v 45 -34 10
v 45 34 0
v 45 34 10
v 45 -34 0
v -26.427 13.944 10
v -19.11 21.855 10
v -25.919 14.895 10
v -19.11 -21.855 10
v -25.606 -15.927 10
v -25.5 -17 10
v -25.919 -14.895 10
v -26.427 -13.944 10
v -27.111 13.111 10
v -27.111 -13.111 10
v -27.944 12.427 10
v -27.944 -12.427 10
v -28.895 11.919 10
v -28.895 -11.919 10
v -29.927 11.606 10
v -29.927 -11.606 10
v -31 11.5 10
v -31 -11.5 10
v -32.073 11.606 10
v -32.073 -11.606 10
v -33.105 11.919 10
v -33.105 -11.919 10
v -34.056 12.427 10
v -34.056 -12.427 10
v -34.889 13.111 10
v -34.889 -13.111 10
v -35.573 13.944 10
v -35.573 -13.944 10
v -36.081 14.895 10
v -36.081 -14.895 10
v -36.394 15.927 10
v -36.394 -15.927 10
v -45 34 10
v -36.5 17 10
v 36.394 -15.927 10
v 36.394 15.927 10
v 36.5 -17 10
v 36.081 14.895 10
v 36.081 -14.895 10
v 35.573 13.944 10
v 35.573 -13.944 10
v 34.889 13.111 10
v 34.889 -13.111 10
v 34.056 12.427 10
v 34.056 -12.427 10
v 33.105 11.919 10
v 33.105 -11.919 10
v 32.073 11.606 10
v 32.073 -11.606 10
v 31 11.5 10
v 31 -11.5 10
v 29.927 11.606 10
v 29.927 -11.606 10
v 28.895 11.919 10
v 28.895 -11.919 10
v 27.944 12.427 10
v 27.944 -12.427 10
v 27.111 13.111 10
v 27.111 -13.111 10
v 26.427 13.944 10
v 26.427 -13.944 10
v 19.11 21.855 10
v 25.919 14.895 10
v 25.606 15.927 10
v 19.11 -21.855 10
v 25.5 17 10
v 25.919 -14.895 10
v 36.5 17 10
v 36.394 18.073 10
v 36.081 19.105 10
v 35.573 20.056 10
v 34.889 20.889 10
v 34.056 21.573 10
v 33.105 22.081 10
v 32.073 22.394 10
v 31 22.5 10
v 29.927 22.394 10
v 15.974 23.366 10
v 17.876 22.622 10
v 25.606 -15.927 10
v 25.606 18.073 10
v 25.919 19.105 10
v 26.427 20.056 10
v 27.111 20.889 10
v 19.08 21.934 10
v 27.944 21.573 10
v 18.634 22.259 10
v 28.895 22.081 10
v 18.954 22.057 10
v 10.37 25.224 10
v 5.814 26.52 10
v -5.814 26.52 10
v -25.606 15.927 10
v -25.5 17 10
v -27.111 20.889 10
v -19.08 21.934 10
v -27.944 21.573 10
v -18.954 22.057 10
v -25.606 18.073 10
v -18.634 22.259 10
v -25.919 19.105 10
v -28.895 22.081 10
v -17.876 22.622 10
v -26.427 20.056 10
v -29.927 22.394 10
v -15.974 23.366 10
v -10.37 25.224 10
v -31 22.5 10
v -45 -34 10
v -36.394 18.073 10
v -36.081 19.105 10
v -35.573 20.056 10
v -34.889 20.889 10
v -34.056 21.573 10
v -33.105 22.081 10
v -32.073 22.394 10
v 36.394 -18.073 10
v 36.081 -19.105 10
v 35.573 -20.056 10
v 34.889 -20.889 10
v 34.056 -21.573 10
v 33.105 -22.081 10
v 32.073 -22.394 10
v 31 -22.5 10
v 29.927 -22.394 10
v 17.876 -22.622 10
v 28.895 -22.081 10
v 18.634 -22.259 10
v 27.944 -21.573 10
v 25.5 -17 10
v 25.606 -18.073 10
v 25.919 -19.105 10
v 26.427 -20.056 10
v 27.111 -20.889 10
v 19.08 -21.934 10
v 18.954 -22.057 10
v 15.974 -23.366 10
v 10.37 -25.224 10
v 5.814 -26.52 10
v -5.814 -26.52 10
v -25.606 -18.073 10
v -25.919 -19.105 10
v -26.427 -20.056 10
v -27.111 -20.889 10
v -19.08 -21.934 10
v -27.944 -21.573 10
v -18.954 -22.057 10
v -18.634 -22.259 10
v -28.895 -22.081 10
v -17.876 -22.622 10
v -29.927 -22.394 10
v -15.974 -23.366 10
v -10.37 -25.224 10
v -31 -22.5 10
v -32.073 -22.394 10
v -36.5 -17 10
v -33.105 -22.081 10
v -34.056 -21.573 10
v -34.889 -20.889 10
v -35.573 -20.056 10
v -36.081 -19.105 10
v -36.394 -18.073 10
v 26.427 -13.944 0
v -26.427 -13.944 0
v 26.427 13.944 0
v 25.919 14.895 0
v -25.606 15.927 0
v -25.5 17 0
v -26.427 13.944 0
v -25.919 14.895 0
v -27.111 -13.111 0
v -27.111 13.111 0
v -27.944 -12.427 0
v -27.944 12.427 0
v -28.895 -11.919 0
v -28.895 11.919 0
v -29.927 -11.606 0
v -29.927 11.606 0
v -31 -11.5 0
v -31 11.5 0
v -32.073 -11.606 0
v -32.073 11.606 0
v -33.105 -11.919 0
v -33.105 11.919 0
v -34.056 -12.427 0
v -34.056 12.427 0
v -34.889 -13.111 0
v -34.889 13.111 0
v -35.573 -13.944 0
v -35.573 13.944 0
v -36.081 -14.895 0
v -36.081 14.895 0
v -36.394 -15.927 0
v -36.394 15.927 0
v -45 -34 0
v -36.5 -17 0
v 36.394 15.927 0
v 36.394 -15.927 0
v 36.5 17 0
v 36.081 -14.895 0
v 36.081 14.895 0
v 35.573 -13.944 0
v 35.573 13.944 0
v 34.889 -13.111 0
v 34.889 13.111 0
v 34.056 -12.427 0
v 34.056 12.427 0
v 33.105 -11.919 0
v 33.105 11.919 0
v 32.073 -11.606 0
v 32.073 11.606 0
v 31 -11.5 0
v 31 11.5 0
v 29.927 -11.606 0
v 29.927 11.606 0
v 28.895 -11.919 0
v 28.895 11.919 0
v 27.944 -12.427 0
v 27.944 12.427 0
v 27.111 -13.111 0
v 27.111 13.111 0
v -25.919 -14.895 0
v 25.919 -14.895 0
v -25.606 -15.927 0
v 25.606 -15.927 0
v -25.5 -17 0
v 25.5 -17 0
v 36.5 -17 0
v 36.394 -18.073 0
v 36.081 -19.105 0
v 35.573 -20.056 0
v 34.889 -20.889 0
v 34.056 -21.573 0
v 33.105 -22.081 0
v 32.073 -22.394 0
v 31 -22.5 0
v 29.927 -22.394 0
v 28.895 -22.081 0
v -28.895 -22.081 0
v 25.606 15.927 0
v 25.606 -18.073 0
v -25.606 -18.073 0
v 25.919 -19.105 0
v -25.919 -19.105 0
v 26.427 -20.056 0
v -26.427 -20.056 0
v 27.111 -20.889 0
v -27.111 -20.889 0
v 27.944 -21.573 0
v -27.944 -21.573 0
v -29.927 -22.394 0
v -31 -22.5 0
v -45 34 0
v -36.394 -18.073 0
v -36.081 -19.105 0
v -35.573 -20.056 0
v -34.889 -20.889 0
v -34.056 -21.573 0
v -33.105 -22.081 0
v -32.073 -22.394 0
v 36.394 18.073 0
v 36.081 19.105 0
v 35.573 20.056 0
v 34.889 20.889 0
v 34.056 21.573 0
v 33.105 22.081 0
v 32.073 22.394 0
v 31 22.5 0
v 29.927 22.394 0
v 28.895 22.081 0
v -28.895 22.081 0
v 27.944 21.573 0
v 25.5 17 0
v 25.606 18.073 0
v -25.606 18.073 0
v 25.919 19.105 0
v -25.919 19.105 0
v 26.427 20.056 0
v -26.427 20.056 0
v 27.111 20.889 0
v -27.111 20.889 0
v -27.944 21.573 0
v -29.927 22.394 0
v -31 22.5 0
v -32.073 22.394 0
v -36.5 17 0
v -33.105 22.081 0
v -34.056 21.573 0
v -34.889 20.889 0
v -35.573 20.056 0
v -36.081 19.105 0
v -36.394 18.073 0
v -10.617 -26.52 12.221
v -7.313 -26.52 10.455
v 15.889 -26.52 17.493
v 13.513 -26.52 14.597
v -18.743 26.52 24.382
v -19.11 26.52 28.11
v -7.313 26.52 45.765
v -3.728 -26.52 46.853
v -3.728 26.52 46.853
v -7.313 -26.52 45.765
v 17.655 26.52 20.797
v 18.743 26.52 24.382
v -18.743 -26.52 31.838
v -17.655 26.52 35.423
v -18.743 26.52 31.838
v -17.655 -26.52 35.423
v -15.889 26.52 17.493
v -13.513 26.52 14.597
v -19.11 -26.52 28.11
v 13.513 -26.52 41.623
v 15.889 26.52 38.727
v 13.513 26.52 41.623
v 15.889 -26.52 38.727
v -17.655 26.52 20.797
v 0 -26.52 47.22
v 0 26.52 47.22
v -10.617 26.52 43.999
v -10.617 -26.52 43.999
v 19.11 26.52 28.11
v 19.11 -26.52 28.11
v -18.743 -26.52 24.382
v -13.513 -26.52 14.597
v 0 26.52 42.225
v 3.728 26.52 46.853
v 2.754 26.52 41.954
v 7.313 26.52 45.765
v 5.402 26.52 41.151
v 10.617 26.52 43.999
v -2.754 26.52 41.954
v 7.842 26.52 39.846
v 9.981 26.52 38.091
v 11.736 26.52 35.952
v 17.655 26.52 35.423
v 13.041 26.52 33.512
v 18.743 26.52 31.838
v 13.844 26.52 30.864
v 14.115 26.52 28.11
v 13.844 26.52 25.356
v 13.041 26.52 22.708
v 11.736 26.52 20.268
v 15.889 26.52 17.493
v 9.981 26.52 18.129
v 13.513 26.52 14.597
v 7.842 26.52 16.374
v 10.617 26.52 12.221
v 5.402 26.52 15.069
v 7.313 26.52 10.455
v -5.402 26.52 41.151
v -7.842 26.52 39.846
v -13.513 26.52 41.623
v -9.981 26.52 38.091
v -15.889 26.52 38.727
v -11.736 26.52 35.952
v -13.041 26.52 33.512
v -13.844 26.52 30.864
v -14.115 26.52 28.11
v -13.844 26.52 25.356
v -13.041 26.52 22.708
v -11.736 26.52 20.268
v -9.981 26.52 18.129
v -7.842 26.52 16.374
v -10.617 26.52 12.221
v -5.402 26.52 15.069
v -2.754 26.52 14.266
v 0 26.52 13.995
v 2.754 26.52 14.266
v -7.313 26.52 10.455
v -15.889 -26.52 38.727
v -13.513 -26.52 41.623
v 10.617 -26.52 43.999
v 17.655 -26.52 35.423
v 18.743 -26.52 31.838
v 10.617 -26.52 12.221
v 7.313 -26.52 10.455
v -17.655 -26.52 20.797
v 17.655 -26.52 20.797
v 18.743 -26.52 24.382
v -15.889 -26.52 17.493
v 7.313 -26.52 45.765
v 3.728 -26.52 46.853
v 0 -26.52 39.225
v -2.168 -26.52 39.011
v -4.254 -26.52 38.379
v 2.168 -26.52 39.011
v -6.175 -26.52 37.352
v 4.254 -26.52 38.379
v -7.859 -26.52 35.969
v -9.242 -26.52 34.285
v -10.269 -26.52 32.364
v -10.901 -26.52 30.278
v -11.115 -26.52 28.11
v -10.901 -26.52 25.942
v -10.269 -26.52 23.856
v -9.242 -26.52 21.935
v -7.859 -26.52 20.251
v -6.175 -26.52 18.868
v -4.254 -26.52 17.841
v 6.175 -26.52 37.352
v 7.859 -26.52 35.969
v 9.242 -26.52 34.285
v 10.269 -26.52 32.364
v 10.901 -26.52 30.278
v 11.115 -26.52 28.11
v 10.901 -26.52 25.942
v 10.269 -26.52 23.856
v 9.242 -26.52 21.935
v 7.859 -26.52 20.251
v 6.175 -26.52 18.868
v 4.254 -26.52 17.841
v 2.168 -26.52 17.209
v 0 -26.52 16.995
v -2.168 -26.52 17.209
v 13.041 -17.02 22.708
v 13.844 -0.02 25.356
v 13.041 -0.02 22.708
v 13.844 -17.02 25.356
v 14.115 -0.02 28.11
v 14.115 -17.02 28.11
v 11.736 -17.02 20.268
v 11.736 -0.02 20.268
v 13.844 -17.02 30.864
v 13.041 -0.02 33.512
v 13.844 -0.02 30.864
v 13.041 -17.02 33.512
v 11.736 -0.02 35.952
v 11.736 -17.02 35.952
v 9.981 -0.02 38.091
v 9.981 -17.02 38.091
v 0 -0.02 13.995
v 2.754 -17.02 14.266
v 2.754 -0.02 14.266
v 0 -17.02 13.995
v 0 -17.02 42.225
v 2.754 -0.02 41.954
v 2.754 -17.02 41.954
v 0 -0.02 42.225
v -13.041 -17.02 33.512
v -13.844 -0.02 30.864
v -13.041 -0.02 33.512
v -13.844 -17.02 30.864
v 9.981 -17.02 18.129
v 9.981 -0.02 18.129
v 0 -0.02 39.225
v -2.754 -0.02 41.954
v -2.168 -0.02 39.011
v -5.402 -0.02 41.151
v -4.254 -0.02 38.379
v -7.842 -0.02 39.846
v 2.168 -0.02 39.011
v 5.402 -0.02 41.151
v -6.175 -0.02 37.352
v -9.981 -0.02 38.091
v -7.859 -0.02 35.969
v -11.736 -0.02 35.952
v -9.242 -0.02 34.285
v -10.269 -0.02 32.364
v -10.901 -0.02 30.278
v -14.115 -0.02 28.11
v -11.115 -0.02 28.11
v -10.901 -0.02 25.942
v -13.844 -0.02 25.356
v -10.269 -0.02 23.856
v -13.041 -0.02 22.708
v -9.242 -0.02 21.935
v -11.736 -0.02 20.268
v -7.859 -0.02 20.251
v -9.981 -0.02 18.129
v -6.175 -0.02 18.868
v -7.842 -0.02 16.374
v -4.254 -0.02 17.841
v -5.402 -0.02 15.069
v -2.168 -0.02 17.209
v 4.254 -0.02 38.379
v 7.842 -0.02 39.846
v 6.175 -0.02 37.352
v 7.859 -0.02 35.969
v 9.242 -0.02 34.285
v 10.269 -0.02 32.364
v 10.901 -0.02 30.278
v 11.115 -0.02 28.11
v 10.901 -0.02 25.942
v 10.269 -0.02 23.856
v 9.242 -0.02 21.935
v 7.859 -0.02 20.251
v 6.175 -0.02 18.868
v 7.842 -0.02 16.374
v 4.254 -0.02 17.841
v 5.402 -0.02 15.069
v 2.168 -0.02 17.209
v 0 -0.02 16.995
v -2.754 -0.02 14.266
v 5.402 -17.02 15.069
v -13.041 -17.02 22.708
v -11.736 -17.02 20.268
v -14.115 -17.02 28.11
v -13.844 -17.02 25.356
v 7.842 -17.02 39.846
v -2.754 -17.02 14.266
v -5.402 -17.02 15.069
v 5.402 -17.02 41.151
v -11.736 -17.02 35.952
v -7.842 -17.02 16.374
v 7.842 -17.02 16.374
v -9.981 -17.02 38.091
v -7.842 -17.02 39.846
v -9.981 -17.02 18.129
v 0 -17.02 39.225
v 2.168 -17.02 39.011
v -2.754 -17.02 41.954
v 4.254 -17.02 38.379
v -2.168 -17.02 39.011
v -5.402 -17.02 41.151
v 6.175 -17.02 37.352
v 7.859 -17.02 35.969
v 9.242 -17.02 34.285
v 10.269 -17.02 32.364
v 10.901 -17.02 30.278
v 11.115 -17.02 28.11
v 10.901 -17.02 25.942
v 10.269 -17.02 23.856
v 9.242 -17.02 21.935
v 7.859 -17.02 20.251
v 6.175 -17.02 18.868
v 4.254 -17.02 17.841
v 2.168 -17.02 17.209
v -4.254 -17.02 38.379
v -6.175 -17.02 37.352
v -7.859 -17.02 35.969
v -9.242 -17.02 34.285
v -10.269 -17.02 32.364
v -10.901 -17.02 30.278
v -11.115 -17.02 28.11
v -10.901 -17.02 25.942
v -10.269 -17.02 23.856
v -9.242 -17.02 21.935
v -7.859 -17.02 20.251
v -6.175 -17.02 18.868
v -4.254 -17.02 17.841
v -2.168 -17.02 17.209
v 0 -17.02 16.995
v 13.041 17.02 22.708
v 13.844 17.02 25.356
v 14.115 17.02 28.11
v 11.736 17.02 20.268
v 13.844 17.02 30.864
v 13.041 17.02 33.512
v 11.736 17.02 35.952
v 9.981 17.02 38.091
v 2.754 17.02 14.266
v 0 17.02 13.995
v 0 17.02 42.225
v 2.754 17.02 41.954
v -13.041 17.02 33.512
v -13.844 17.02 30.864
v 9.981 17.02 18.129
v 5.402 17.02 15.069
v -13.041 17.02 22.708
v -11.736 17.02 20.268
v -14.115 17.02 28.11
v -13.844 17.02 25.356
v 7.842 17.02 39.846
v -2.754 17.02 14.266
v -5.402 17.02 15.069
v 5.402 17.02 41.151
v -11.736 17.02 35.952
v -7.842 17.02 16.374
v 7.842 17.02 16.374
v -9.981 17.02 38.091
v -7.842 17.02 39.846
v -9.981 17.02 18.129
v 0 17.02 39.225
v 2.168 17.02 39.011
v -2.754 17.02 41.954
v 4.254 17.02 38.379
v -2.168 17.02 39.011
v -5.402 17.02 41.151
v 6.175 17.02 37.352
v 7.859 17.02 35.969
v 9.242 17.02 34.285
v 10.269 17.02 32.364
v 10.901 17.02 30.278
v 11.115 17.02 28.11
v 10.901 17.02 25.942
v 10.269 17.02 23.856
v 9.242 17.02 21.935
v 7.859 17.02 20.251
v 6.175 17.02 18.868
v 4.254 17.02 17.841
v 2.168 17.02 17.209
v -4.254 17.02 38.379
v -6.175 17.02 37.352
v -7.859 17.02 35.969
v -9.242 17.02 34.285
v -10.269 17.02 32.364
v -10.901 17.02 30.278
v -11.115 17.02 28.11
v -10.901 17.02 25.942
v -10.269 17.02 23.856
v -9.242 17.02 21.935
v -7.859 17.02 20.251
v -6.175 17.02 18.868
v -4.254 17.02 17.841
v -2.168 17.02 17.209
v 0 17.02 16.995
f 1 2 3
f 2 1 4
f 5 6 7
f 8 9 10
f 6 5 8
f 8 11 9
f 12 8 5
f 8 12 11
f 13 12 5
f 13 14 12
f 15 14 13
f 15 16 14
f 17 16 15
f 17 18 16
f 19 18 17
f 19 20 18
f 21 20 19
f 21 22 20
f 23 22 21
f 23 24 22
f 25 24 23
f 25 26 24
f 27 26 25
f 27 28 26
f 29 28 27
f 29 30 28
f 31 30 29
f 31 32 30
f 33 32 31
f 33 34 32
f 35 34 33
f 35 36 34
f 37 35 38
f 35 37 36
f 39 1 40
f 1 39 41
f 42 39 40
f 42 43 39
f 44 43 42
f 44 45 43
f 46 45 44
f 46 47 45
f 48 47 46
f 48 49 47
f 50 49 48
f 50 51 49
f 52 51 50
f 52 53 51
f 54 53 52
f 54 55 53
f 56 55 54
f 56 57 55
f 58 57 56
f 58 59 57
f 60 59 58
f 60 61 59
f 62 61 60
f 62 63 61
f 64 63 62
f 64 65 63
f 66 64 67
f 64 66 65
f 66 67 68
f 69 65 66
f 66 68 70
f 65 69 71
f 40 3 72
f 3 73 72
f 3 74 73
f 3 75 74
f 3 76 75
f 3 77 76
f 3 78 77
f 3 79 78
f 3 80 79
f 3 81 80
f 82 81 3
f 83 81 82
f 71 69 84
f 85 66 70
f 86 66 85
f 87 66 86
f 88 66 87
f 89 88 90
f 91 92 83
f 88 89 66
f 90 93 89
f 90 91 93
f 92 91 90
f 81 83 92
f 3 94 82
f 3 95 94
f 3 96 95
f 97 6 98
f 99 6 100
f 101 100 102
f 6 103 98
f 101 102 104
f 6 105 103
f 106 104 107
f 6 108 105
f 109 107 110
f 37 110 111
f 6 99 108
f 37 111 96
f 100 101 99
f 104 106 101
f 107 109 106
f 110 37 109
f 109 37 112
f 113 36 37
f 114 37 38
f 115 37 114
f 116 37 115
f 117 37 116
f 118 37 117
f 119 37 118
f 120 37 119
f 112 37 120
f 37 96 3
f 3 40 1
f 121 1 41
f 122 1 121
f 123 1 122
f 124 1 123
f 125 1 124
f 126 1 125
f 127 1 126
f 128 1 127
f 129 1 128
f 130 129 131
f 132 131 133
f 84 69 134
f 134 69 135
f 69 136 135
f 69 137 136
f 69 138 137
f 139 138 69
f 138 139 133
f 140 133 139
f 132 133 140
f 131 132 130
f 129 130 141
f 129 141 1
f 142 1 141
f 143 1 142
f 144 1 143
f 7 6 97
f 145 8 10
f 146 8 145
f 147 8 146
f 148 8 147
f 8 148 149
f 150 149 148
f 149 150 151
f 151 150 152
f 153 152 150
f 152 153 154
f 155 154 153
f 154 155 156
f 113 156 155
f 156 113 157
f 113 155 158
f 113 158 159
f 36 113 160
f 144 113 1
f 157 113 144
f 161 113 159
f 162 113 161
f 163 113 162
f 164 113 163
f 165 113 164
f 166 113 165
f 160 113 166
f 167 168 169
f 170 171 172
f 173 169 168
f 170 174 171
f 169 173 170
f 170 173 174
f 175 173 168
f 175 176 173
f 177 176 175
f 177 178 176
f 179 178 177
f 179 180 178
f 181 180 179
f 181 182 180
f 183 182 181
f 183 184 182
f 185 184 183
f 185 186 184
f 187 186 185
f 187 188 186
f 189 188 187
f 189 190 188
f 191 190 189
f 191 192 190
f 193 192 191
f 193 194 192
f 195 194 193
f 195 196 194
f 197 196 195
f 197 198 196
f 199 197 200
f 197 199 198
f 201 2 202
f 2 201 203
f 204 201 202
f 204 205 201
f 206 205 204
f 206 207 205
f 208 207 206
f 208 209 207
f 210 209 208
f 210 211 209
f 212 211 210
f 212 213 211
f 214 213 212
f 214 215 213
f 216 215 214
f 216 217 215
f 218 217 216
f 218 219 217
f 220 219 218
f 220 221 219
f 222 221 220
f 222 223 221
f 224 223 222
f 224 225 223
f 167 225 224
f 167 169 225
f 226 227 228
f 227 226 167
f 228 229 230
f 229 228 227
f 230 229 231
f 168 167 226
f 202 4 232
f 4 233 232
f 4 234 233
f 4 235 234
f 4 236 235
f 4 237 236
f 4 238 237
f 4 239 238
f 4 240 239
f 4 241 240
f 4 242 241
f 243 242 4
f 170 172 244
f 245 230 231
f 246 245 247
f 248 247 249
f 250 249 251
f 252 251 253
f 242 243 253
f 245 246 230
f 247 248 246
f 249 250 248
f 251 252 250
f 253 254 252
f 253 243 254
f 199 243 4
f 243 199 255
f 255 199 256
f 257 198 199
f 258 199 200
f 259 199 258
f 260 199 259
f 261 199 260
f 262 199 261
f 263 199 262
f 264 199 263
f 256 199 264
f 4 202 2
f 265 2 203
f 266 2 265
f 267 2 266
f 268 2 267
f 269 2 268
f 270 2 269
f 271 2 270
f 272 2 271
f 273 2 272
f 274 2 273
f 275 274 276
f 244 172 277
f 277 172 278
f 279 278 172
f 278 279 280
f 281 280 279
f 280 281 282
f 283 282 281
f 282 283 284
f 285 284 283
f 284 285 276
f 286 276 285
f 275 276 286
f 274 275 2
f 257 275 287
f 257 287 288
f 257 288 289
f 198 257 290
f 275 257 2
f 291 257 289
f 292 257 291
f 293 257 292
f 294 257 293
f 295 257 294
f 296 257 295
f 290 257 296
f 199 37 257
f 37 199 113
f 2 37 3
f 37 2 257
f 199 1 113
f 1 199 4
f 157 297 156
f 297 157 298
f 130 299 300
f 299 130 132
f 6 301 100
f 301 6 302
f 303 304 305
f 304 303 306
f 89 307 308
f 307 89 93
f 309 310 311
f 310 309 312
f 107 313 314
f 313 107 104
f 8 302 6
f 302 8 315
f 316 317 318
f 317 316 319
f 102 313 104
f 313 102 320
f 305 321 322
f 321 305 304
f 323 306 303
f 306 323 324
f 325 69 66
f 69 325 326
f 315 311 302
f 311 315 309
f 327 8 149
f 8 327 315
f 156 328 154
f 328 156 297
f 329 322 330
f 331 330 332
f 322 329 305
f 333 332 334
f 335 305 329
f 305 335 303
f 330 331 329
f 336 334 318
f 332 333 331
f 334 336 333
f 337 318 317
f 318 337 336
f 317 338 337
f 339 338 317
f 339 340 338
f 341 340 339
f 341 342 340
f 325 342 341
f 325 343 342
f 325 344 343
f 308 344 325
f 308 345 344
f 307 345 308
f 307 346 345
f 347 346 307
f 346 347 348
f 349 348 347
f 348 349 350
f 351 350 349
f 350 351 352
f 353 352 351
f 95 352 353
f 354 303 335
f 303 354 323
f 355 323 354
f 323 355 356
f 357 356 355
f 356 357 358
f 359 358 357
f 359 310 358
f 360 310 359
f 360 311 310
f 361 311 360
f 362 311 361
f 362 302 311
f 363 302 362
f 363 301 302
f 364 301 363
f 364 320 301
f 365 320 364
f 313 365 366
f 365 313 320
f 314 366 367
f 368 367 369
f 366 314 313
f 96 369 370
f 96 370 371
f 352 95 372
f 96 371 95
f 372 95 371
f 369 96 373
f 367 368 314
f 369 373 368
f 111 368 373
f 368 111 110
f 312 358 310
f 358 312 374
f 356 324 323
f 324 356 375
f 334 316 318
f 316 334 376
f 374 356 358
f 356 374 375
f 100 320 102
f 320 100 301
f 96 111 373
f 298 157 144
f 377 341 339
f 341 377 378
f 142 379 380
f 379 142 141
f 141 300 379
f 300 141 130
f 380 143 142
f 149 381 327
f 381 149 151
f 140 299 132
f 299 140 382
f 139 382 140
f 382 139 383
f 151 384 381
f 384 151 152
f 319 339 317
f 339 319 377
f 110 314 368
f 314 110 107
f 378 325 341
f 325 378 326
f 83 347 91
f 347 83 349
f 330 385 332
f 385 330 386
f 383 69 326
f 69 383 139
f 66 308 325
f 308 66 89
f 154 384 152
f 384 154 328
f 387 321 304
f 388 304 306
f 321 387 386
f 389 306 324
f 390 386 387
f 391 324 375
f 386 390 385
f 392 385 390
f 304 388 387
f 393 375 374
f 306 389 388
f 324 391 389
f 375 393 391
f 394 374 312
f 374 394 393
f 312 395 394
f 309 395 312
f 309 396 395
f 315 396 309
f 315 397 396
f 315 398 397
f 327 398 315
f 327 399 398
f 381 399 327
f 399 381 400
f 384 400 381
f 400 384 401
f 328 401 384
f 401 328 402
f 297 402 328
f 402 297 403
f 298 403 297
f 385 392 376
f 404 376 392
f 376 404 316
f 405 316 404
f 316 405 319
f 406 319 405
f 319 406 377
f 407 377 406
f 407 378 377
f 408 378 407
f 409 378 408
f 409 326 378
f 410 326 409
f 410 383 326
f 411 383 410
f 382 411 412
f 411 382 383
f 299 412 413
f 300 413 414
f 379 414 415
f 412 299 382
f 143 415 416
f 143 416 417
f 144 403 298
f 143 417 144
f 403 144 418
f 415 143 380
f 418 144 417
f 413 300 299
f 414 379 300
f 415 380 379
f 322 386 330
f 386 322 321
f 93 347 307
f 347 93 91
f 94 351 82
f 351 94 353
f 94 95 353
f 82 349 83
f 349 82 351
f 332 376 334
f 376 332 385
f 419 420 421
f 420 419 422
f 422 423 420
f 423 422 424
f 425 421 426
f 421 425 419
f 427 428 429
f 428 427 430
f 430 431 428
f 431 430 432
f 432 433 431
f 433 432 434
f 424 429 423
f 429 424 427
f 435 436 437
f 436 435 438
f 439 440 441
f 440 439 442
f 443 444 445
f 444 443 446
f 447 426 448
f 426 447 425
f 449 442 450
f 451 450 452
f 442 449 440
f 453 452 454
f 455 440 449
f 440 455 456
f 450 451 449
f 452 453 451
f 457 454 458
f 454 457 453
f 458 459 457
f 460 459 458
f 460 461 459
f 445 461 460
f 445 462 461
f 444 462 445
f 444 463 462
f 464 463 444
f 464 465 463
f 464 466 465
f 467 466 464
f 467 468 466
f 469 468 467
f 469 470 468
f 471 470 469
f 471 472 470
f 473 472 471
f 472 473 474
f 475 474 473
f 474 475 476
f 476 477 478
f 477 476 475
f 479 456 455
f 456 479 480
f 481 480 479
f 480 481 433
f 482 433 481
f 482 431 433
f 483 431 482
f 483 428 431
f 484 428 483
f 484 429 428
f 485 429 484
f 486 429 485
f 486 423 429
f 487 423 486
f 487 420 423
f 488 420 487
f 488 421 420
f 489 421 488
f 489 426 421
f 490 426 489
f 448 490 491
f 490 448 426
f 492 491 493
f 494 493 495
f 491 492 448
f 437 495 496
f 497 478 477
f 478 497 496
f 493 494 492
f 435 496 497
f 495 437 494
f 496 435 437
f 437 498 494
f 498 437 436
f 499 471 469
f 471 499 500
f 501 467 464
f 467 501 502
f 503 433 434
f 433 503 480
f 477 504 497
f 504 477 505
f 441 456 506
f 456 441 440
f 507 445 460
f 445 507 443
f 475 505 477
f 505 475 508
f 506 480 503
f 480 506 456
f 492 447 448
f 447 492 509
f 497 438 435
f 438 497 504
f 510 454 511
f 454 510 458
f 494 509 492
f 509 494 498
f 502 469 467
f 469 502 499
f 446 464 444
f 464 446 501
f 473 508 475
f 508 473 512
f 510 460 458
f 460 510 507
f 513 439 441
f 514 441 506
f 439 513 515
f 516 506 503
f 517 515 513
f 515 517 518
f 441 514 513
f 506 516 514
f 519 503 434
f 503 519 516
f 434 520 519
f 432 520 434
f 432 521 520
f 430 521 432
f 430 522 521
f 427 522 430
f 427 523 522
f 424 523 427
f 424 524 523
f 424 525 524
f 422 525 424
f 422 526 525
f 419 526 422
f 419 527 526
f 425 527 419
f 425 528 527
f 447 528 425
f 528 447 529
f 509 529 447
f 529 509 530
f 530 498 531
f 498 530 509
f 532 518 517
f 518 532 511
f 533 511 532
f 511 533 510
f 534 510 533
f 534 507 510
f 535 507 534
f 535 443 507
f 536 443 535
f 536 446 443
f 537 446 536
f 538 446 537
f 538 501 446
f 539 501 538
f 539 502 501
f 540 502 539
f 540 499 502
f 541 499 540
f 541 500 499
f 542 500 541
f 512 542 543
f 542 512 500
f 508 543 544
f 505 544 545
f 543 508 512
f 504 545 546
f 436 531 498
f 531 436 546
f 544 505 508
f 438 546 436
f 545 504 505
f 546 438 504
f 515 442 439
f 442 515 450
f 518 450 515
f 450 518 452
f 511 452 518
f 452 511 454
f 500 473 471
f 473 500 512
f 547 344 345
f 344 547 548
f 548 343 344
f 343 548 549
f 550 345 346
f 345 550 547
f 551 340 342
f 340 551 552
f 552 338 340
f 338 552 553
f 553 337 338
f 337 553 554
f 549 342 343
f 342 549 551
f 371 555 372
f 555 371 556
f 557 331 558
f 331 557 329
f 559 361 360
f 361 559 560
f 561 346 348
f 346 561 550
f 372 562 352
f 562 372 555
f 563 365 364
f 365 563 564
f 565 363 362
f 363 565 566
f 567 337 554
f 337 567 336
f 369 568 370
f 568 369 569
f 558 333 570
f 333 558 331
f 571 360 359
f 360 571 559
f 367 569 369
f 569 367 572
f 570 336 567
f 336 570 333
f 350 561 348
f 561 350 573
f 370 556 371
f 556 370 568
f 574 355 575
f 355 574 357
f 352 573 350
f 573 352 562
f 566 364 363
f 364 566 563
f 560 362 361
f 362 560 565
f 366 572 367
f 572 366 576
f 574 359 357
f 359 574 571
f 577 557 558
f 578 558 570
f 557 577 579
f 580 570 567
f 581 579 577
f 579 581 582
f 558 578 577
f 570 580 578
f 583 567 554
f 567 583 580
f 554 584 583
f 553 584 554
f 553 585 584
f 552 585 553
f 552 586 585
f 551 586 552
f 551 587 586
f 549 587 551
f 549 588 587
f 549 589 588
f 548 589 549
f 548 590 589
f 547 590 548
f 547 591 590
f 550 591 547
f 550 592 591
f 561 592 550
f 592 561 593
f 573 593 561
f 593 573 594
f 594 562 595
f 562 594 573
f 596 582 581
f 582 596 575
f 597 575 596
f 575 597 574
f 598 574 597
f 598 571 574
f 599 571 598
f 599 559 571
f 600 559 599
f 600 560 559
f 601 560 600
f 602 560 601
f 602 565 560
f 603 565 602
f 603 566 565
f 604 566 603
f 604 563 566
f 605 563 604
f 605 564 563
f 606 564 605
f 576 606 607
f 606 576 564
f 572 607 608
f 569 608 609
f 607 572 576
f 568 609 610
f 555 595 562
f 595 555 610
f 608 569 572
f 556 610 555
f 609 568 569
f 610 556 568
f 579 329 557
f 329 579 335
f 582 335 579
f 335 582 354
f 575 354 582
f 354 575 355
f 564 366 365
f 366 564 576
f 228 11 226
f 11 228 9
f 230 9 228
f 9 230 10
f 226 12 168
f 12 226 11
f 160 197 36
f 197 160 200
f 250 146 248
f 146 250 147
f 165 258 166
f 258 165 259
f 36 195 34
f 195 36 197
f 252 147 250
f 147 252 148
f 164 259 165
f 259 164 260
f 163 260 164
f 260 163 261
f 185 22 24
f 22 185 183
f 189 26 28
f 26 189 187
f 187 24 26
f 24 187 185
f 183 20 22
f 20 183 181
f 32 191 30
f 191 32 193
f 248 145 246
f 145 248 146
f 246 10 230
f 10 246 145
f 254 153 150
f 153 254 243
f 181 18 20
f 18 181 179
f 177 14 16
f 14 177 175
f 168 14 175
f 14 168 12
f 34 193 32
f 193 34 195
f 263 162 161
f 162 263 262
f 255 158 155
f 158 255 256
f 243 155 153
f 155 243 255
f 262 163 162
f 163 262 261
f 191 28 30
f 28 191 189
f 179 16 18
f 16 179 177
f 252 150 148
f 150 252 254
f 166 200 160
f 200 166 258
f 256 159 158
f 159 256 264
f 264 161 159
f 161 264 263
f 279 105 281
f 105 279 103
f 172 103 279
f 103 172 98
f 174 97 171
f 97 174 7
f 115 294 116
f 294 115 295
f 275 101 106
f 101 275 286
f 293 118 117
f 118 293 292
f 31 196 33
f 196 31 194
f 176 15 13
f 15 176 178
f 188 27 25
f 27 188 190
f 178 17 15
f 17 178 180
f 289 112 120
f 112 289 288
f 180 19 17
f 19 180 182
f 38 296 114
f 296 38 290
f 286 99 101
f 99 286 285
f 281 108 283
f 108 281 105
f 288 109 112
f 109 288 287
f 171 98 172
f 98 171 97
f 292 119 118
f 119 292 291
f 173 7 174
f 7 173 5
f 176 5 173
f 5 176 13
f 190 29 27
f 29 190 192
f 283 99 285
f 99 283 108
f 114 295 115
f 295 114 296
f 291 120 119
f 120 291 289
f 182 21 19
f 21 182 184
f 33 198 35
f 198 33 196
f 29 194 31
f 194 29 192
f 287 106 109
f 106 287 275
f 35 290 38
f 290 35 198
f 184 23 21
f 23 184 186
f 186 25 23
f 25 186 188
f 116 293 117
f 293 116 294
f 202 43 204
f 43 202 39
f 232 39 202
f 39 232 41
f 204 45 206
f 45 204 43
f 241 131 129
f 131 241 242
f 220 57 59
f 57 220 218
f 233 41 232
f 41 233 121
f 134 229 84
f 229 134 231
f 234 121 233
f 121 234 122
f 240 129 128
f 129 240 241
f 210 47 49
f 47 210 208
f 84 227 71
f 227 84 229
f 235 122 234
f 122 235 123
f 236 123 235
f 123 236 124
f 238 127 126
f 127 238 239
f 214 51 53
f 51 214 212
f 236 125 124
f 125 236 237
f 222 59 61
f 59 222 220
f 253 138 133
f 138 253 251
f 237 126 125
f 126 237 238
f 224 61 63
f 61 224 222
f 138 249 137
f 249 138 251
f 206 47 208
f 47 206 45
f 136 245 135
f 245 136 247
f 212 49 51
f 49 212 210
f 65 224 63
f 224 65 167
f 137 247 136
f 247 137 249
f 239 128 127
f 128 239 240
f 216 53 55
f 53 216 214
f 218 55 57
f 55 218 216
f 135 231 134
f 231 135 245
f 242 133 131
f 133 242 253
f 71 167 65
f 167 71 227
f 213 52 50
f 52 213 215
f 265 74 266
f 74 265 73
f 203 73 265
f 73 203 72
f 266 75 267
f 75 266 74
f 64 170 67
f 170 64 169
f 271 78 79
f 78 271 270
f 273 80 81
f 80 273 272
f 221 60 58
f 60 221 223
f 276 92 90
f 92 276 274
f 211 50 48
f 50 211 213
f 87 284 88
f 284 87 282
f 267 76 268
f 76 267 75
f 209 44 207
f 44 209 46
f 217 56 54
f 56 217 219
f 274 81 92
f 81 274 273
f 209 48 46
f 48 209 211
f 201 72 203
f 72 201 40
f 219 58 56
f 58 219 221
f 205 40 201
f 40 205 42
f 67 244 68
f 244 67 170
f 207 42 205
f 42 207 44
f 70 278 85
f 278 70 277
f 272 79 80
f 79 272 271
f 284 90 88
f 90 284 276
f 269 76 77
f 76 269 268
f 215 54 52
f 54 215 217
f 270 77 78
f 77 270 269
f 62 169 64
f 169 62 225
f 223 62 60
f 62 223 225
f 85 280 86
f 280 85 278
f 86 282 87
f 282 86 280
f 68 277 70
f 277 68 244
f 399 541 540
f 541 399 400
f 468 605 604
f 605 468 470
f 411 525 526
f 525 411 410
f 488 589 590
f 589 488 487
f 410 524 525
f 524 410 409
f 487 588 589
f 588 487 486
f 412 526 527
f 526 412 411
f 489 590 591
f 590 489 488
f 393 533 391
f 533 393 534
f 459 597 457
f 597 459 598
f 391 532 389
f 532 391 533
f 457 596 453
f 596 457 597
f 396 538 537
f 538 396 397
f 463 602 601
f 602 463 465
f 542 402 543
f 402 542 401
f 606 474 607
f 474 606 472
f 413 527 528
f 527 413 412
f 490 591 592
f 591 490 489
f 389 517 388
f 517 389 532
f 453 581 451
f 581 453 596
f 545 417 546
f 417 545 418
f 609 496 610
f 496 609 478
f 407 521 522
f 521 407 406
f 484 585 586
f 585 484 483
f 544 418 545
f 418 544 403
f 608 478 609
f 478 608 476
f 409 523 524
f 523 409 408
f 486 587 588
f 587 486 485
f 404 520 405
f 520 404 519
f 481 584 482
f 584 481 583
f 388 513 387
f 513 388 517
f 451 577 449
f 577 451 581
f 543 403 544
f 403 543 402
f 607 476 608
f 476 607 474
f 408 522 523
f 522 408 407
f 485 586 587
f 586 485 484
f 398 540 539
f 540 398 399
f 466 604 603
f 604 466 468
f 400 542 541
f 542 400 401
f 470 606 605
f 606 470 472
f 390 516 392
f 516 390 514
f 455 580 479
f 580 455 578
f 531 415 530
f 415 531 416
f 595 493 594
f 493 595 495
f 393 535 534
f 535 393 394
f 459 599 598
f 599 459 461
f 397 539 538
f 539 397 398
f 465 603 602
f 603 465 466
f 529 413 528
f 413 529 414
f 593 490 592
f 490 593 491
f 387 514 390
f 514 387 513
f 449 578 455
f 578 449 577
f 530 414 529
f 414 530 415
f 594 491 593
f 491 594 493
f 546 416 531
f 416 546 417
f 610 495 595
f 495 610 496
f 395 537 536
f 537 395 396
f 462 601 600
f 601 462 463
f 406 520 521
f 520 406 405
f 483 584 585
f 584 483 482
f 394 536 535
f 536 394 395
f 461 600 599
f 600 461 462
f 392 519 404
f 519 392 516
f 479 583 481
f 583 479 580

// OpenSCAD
$fn = 32;

// ----------------------------------------------------------------------
// Bearing block: 90 x 68 mm base, 22.23 mm bore at 28.11 mm
// ----------------------------------------------------------------------

// --- parameters (mm) ---
base_w = 90;              // base width
base_d = 68;              // base depth
base_t = 10;              // base thickness
bore_d = 22.23;           // shaft / bearing bore
house_r = 19.11;          // housing outer radius
house_len = 53.04;        // housing length along the shaft
foot_w = 38.22;           // foot width under the housing
foot_len = 43.04;         // foot length along the shaft
axis_z = 28.11;           // bore axis height above the base
holes_d = 11;             // mounting holes
hole_x = 31;              // mounting hole spacing
seat_d = 12;              // bearing seat depth
seat_wall = 3;            // seat wall thickness

difference() {
  union() {
    /* base plate with its underside on z = 0 */
    translate([0, 0, base_t / 2]) cube([base_w, base_d, base_t], center = true);
    /* hull foot: a straight web blending into the round housing */
    hull() {
      translate([0, 0, base_t - 0.5]) cube([foot_w, foot_len, 1.6], center = true);
      translate([0, 0, axis_z]) rotate([-90, 0, 0]) cylinder(h = house_len, d = 2 * house_r, center = true);
    }
  }
  /* bore through the housing, 2.5 mm clear on both sides */
  translate([0, 0, axis_z]) rotate([-90, 0, 0]) cylinder(h = house_len + 5, d = bore_d, center = true);
  /* bearing seats, recessed into both ends of the housing */
  for (sy = [-1, 1]) {
    translate([0, sy * (house_len / 2 - seat_d + 2.5), axis_z]) rotate([-90, 0, 0]) cylinder(h = seat_d + 5, d = bore_d + 2 * seat_wall);
  }
  /* mounting holes through the base plate */
  for (hx = [-31, 31]) {
    for (hy = [-17, 17]) {
      translate([hx, hy, -2.5]) cylinder(h = base_t + 5, d = holes_d);
    }
  }
}
